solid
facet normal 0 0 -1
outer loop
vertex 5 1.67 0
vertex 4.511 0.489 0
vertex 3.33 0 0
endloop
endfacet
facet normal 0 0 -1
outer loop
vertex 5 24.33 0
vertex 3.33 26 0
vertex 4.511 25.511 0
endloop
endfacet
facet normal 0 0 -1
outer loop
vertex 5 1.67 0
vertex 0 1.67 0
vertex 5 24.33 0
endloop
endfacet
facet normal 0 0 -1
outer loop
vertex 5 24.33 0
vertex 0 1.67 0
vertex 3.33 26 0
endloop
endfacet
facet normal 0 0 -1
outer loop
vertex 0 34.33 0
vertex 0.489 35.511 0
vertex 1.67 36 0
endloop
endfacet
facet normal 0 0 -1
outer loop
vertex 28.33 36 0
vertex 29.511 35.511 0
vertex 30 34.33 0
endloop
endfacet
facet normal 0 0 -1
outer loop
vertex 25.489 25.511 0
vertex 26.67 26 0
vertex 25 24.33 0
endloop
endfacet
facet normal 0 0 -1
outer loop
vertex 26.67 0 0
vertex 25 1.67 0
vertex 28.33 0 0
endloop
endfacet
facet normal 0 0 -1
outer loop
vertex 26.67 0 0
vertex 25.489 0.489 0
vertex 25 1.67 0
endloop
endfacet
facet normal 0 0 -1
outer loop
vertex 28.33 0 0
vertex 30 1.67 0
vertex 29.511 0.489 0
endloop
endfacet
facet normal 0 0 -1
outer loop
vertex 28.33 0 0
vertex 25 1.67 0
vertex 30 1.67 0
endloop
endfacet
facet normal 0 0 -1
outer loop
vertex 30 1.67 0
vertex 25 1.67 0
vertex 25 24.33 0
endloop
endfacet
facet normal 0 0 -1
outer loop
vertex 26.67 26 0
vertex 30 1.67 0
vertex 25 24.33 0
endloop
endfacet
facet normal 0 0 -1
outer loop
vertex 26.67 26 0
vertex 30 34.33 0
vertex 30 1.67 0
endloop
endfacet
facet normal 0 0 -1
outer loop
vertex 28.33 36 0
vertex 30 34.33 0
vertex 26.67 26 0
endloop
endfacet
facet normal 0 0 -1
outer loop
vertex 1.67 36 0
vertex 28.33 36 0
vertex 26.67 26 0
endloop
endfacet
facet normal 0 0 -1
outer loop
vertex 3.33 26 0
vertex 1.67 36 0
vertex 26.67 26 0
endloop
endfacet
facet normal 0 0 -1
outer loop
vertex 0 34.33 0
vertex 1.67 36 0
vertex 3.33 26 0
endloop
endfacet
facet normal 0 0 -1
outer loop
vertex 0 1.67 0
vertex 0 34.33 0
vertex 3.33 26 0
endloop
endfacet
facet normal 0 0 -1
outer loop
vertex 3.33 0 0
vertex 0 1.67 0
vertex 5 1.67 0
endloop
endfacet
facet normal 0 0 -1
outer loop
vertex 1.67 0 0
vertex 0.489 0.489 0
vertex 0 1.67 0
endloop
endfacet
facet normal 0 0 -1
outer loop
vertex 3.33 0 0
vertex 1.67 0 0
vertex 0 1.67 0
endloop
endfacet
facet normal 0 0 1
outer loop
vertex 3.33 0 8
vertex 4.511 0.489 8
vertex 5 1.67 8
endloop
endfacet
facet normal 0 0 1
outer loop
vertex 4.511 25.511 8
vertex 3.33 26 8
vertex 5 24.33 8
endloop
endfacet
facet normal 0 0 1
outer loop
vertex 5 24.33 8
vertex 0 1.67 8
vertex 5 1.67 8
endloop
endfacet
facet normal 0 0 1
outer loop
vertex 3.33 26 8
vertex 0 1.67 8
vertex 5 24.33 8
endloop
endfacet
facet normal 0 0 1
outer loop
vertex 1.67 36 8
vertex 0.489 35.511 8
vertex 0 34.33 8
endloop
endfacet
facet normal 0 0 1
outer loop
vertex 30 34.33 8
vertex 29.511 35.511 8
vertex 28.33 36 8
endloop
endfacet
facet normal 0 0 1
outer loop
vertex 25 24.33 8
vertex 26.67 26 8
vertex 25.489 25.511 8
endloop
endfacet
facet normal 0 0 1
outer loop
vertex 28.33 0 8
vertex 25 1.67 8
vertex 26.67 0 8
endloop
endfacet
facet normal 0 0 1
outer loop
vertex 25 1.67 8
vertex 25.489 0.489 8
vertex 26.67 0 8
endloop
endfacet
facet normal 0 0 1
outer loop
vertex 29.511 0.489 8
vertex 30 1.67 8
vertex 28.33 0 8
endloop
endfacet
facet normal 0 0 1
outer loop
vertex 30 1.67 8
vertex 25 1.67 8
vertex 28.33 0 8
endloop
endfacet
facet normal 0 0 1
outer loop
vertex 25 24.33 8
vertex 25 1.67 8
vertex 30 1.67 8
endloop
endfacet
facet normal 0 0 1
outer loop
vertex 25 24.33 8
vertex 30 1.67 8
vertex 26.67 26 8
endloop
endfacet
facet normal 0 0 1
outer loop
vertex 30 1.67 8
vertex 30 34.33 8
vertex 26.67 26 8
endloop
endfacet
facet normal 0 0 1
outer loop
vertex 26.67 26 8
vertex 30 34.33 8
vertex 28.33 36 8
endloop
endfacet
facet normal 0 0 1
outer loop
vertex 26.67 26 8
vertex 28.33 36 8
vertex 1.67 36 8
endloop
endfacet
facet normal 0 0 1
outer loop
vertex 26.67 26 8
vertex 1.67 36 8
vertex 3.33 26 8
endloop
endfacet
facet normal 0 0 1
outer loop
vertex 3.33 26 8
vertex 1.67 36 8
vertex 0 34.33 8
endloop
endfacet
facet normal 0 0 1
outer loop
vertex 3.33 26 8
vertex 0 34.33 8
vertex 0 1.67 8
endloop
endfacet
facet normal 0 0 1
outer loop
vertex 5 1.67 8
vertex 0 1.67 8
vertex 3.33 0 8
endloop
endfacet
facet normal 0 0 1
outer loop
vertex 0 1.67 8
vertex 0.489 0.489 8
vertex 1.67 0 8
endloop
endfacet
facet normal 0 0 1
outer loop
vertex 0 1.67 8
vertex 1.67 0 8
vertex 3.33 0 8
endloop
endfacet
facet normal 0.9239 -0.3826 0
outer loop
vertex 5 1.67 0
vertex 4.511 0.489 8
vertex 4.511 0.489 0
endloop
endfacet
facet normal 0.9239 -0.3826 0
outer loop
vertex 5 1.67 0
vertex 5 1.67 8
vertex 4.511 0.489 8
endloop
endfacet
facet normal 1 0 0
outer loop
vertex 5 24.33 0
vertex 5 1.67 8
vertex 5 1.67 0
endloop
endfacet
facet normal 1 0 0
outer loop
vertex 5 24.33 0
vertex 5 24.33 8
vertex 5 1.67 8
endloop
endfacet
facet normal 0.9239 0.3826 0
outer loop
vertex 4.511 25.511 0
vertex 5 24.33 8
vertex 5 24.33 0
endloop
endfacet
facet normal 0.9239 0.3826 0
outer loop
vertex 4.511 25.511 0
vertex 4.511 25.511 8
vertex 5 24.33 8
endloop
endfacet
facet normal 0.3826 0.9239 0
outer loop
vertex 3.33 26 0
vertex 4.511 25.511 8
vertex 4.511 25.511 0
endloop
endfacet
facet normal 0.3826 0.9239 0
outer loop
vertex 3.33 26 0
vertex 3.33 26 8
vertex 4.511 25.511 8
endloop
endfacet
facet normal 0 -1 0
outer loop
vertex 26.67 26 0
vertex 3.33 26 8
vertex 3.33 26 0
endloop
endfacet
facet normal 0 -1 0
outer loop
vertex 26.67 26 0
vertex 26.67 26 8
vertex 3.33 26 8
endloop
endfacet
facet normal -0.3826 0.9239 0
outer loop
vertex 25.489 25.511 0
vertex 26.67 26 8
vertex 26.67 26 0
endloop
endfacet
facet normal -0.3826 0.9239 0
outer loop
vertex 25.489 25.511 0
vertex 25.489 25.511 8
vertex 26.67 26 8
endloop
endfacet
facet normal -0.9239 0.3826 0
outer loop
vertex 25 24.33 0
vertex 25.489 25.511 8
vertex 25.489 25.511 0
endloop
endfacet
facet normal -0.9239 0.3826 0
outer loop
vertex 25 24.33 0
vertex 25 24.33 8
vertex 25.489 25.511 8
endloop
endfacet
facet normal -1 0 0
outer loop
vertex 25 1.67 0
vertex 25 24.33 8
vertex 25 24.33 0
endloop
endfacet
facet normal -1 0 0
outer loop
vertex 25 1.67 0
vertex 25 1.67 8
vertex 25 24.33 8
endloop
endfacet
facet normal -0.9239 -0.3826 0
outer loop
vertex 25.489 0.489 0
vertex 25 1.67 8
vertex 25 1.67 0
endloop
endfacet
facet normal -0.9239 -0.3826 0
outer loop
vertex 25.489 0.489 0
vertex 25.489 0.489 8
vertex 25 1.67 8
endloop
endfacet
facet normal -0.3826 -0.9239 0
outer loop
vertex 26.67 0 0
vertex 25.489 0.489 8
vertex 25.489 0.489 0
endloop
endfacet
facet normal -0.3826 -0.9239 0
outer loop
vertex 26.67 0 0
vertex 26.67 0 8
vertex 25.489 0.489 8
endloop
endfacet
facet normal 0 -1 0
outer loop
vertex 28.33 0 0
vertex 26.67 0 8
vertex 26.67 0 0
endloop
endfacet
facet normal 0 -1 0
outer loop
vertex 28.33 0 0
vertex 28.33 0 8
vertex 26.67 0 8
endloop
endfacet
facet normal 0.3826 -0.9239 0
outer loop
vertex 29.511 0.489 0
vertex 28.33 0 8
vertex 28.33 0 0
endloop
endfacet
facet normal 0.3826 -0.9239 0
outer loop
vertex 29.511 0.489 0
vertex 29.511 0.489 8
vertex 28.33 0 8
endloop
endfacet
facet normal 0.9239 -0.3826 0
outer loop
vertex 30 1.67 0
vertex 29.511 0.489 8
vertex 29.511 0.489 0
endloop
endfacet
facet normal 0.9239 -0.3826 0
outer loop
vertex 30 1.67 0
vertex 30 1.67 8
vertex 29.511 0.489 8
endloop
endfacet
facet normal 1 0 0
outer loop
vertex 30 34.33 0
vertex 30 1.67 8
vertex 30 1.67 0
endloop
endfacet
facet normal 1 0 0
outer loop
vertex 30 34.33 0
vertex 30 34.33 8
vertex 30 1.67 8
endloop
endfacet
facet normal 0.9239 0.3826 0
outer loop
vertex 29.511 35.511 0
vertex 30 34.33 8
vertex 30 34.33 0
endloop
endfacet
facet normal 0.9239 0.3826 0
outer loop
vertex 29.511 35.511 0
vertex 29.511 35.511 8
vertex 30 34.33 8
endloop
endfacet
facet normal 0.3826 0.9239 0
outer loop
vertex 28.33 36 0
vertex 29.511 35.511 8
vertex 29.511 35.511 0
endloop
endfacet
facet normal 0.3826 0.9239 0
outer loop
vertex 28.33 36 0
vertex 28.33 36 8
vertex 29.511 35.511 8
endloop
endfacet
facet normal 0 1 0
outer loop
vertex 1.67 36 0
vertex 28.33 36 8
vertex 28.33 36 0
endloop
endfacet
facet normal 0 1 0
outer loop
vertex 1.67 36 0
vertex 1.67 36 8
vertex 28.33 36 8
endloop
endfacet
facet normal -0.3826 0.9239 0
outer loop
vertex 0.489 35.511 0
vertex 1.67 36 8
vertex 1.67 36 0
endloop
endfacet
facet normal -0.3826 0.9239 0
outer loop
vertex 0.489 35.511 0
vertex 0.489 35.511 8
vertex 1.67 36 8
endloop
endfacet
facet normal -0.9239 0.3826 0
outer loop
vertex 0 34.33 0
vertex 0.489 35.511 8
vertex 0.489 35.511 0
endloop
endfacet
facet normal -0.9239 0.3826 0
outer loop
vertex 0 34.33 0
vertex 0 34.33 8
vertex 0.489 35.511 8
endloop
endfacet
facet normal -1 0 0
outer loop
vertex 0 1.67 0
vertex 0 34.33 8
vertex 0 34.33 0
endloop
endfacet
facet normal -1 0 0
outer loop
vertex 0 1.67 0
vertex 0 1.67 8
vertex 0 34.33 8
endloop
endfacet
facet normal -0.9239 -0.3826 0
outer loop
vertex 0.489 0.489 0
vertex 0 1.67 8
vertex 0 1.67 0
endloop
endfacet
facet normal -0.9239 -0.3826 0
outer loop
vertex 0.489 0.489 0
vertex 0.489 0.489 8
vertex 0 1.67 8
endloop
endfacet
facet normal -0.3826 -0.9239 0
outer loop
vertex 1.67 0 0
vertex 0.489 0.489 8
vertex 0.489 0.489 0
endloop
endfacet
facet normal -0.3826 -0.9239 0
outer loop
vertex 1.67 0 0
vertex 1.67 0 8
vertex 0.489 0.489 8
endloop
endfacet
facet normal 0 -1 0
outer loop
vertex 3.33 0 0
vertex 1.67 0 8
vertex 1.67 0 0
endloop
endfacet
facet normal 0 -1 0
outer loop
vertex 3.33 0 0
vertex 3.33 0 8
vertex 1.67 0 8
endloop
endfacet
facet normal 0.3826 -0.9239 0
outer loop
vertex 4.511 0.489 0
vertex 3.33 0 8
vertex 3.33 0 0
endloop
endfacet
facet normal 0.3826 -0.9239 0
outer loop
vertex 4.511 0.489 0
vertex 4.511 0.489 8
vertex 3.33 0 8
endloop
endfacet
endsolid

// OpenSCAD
$fn = 32;

// ----------------------------------------------------------------------
// Clip blank: staple clip, 8 mm thick
// ----------------------------------------------------------------------

// --- parameters (mm) ---
profile_height = 8;       // extrusion height
profile_points = 24;      // points of the closed outline

profile = [[0, 1.67], [0.489, 0.489], [1.67, 0], [3.33, 0], [4.511, 0.489], [5, 1.67], [5, 24.33], [4.511, 25.511], [3.33, 26], [26.67, 26], [25.489, 25.511], [25, 24.33], [25, 1.67], [25.489, 0.489], [26.67, 0], [28.33, 0], [29.511, 0.489], [30, 1.67], [30, 34.33], [29.511, 35.511], [28.33, 36], [1.67, 36], [0.489, 35.511], [0, 34.33]];  // single closed polygon, 24 points, counter clockwise

// --- the one profile operation ---
linear_extrude(height = profile_height) polygon(points = profile);
